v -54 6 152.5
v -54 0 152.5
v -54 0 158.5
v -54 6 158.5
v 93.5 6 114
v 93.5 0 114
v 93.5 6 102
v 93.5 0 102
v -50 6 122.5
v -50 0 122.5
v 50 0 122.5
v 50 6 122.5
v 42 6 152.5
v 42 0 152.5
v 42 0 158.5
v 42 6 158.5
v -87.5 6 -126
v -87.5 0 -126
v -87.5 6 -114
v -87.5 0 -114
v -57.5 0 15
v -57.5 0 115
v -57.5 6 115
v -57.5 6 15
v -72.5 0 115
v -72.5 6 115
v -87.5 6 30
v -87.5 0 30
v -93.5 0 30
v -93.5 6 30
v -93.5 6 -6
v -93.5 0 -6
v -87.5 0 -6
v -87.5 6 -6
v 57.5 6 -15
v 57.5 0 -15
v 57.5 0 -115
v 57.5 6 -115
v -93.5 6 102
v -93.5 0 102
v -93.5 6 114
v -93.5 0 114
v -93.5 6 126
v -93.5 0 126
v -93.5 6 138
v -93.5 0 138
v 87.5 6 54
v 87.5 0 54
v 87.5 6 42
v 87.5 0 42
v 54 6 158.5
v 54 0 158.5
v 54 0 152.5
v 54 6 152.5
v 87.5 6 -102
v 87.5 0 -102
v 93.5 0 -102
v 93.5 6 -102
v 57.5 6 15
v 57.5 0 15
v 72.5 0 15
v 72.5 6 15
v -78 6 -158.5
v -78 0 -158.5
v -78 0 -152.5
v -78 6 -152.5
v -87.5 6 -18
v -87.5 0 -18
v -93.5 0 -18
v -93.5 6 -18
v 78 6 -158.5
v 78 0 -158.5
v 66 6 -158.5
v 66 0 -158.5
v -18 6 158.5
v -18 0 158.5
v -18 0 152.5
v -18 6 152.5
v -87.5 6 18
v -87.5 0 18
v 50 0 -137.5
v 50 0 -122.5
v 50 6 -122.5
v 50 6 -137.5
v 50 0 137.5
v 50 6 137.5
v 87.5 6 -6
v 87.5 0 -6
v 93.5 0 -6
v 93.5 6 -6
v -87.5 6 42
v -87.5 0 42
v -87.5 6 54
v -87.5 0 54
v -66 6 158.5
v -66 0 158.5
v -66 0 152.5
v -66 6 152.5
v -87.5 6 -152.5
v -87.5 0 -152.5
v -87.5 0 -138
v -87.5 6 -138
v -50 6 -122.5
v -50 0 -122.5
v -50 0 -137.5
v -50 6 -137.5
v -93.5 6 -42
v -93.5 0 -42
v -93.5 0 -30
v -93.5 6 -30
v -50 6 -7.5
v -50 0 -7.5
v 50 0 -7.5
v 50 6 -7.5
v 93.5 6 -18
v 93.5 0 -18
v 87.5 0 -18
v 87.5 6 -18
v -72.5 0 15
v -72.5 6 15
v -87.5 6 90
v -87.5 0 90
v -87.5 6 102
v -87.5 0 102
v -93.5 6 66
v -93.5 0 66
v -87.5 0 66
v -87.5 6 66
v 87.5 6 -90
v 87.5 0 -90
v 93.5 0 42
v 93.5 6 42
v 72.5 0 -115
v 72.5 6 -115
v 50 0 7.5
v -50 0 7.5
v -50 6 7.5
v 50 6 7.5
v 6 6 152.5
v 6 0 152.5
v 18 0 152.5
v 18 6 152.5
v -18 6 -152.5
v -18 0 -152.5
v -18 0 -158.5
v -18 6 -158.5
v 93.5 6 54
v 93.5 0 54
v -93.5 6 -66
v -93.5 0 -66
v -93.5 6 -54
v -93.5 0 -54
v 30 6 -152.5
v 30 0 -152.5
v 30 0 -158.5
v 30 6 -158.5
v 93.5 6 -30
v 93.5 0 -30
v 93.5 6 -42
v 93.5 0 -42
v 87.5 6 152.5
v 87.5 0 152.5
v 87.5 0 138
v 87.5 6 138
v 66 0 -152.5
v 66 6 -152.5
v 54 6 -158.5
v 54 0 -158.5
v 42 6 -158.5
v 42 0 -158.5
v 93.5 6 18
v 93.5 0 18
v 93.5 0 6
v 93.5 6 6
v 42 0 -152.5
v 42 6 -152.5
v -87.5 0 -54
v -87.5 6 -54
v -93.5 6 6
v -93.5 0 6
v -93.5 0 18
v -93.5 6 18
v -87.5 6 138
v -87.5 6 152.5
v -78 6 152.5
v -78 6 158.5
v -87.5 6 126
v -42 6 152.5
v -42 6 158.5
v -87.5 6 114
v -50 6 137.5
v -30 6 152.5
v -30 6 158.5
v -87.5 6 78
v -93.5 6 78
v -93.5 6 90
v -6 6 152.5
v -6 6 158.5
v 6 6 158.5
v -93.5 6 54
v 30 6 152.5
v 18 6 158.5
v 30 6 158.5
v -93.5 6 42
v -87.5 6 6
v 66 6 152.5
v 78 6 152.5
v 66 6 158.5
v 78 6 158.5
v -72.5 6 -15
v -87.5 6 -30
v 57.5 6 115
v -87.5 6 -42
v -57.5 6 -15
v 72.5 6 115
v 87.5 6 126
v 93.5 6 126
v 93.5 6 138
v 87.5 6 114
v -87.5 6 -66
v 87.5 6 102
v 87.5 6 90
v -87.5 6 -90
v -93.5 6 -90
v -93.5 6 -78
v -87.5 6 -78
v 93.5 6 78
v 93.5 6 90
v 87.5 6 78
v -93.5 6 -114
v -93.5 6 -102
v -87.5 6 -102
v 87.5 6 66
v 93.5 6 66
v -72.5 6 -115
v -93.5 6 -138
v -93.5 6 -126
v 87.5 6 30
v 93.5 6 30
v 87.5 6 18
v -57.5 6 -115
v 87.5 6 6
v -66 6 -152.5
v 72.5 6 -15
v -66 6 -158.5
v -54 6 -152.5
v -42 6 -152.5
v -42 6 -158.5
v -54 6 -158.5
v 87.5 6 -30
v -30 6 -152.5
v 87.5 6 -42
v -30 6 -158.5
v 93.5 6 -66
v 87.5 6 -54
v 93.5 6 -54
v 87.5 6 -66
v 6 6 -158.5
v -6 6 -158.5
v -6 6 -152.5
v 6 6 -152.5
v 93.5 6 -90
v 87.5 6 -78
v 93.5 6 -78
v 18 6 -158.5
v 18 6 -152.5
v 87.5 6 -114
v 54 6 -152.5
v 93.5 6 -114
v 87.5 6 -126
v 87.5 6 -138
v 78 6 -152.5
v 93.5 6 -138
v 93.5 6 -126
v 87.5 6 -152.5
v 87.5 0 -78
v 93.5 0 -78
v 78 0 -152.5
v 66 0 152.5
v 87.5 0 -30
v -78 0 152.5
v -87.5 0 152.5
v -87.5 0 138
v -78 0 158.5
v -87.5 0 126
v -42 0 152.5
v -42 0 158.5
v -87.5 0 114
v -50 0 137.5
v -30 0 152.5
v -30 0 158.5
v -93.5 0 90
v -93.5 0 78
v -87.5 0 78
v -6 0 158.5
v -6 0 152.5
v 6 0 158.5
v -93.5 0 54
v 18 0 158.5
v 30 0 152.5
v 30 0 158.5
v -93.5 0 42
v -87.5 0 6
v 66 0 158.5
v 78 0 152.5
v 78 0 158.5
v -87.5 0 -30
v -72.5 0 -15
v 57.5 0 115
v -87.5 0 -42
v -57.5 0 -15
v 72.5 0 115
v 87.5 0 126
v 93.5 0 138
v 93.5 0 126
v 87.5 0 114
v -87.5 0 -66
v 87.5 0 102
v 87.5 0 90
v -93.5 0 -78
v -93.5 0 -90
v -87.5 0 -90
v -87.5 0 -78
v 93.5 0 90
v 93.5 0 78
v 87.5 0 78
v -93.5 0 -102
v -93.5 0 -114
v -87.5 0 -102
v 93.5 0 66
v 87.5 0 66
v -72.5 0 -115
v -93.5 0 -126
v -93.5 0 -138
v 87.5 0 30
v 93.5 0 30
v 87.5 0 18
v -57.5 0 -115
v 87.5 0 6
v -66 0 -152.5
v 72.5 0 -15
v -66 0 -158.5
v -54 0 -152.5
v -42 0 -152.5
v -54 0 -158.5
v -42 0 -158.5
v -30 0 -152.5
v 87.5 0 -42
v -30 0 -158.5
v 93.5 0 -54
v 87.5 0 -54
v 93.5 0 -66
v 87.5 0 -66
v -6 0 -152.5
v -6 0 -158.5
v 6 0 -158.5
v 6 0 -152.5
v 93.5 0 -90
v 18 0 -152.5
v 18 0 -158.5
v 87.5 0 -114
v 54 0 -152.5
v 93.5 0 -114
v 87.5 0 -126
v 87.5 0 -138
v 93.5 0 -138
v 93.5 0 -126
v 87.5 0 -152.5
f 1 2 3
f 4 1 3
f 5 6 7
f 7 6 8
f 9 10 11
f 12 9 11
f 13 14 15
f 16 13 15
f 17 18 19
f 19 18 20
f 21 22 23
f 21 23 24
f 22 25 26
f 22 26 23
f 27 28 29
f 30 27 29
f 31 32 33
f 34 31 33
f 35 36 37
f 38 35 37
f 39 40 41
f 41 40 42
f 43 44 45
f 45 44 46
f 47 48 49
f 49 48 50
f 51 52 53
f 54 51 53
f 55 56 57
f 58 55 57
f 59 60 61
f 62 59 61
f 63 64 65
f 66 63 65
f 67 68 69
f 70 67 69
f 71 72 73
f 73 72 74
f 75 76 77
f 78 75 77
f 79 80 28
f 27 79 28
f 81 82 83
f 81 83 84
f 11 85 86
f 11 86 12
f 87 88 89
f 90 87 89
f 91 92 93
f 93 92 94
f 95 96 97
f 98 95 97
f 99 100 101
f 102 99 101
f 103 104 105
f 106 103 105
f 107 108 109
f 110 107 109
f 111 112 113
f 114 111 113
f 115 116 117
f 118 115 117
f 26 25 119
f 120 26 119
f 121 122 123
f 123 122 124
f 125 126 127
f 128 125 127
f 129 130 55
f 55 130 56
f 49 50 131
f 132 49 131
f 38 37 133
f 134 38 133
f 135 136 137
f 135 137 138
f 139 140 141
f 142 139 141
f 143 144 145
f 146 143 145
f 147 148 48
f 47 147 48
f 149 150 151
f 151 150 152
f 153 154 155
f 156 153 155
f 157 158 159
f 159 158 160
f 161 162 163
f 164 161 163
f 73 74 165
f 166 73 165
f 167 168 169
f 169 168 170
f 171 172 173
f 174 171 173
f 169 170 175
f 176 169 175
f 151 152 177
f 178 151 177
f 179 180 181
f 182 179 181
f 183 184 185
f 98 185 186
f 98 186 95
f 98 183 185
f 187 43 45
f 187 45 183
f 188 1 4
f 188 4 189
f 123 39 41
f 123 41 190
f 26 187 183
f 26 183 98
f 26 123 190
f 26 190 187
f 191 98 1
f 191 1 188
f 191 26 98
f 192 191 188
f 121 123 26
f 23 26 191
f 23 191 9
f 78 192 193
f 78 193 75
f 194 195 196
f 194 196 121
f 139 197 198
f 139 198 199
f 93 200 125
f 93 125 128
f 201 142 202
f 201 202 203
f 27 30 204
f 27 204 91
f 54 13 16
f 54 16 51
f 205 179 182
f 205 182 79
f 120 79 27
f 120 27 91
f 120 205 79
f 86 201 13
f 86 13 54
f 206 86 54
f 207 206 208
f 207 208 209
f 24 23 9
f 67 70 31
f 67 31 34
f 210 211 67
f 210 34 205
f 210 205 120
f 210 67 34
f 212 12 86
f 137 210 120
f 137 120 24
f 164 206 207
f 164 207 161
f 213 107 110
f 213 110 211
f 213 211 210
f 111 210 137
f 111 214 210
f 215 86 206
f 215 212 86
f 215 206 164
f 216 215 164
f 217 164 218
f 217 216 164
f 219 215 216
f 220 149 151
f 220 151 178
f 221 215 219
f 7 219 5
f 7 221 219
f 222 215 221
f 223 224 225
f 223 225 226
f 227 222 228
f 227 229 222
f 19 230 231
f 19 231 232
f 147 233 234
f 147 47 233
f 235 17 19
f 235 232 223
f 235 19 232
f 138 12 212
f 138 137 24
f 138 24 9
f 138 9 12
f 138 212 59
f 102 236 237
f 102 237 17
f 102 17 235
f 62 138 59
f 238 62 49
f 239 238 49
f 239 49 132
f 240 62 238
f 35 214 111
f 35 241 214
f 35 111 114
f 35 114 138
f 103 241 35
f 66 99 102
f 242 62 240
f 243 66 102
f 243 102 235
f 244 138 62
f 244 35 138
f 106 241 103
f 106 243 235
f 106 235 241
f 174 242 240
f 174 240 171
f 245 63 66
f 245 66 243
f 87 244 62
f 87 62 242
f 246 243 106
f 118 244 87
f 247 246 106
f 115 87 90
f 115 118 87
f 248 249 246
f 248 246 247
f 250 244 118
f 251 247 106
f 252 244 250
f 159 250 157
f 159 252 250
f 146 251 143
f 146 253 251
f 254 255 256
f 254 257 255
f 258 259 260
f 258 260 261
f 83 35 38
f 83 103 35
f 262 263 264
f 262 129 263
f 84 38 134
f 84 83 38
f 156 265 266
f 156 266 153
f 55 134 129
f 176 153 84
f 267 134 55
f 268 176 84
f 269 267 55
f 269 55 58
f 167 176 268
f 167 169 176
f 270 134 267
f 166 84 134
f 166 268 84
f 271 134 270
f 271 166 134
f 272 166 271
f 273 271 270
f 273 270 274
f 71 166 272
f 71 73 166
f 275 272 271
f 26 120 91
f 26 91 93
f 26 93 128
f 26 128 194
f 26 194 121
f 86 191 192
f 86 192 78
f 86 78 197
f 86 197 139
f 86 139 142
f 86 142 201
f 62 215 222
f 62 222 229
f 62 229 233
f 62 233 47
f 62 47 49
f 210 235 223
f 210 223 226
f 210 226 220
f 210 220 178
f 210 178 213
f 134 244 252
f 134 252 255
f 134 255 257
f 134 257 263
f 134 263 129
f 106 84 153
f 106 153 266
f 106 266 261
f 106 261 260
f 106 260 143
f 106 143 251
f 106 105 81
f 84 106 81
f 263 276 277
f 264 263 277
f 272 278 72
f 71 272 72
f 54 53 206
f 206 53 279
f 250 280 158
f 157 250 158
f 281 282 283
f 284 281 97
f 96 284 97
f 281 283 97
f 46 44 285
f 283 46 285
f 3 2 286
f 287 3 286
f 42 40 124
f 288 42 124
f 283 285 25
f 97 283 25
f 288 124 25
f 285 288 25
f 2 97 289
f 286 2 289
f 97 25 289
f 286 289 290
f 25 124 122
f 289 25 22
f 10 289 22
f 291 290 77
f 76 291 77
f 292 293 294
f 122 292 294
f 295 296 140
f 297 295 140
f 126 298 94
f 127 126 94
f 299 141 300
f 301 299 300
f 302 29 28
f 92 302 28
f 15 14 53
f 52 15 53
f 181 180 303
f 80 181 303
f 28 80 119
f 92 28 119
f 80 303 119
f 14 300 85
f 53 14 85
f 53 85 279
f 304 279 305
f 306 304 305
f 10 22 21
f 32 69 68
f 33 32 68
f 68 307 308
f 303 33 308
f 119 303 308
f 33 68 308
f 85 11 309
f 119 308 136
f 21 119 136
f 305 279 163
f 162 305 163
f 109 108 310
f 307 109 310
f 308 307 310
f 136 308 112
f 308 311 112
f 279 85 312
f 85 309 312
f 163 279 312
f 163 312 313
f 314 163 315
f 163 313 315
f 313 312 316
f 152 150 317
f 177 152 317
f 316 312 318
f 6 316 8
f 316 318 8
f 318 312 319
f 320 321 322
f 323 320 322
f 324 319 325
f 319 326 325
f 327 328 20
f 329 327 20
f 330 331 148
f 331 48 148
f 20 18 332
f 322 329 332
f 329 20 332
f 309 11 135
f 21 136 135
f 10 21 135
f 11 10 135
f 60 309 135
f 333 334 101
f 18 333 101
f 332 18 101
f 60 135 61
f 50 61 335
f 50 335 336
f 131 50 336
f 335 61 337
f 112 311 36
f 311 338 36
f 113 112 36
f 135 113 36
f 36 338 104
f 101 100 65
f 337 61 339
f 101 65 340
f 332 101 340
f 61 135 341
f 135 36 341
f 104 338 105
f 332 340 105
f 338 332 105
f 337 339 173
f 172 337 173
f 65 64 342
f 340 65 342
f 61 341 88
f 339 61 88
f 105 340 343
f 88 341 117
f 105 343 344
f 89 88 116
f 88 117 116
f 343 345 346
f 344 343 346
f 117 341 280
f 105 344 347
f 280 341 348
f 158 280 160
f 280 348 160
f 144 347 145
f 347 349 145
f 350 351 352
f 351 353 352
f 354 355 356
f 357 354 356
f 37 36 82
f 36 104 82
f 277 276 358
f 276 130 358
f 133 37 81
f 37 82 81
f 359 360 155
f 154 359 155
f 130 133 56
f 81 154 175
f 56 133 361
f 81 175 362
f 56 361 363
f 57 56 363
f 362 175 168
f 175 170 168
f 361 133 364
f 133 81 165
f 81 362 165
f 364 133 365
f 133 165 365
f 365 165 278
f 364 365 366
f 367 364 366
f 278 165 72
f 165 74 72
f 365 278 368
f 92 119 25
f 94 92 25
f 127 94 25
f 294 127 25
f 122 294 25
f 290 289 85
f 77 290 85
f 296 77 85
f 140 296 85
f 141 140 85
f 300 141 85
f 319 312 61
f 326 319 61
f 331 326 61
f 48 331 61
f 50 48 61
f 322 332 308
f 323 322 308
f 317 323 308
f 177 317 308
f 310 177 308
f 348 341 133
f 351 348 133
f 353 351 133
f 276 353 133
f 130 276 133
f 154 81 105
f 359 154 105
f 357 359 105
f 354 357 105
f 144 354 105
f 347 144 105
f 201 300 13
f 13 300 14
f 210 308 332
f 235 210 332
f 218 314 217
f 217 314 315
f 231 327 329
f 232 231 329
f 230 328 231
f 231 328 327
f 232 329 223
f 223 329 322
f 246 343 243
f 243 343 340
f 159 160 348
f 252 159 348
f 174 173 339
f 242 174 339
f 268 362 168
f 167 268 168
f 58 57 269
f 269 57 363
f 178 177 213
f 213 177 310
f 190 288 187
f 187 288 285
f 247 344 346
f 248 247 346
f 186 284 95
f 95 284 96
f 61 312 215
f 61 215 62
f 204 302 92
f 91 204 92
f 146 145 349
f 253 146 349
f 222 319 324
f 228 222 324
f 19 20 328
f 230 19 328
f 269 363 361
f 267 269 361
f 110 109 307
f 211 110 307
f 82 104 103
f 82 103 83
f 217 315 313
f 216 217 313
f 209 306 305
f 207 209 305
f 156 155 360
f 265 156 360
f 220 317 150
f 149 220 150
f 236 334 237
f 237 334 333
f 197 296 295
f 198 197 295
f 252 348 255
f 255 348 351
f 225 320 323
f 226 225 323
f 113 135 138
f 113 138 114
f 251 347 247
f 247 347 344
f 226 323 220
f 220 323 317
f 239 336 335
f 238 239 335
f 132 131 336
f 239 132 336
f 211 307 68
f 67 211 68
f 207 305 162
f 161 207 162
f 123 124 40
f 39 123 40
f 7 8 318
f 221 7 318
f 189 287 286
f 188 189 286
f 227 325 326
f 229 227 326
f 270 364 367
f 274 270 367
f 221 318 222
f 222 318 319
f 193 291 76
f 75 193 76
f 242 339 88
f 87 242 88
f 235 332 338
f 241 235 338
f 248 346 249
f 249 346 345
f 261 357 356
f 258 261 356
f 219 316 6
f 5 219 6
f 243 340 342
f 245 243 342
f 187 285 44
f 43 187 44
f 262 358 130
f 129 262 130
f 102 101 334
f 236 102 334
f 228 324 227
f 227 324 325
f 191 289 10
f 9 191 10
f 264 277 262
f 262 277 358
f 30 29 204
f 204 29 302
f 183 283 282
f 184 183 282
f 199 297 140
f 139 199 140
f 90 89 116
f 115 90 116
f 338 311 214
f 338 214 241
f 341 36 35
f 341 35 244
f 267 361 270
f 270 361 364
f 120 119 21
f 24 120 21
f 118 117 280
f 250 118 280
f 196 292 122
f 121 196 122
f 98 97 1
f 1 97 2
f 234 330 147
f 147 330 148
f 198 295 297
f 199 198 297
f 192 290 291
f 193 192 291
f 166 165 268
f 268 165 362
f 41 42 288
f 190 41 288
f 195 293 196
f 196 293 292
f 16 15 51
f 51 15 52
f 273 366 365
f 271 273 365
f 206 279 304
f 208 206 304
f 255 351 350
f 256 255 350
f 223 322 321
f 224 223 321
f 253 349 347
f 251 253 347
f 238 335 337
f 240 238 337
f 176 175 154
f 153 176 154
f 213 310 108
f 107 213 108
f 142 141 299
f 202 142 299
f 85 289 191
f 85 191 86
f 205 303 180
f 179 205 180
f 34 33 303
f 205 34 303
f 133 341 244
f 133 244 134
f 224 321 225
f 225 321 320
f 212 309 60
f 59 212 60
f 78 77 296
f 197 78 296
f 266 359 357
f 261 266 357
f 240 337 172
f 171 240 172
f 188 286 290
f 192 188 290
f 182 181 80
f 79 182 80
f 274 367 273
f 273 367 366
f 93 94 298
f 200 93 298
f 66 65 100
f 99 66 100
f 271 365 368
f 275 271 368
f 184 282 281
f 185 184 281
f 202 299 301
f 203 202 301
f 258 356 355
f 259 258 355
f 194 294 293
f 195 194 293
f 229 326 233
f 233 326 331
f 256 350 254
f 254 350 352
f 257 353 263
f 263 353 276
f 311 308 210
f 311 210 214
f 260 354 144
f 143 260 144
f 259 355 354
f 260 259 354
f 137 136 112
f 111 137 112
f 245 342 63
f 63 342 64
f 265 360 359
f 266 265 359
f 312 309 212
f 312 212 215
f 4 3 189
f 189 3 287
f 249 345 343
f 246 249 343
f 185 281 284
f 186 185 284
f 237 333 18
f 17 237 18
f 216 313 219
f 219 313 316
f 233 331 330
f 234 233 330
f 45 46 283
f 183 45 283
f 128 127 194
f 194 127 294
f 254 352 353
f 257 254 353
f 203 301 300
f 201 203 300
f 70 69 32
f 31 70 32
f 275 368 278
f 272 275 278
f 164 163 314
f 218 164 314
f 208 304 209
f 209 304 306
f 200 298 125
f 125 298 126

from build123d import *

# Parameters (mm, degrees)
SKETCH3_W           = 15
SKETCH3_H           = 100
SKETCH3_W_2         = 100
SKETCH3_H_2         = 15
BOSS_EXTRUDE4_DEPTH = 6


with BuildPart() as part:
    # Sketch3 → Boss-Extrude4 (new body)
    with BuildSketch(Plane(origin=(0, 0, 0), x_dir=(1, 0, 0), z_dir=(0, 1, 0))):
        Polygon((-87.5, -152.5), (-78, -152.5), (-78, -158.5), (-66, -158.5), (-66, -152.5), (-54, -152.5), (-54, -158.5), (-42, -158.5), (-42, -152.5), (-30, -152.5), (-30, -158.5), (-18, -158.5), (-18, -152.5), (-6, -152.5), (-6, -158.5), (6, -158.5), (6, -152.5), (18, -152.5), (18, -158.5), (30, -158.5), (30, -152.5), (42, -152.5), (42, -158.5), (54, -158.5), (54, -152.5), (66, -152.5), (66, -158.5), (78, -158.5), (78, -152.5), (87.5, -152.5), (87.5, -138), (93.5, -138), (93.5, -126), (87.5, -126), (87.5, -114), (93.5, -114), (93.5, -102), (87.5, -102), (87.5, -90), (93.5, -90), (93.5, -78), (87.5, -78), (87.5, -66), (93.5, -66), (93.5, -54), (87.5, -54), (87.5, -42), (93.5, -42), (93.5, -30), (87.5, -30), (87.5, -18), (93.5, -18), (93.5, -6), (87.5, -6), (87.5, 6), (93.5, 6), (93.5, 18), (87.5, 18), (87.5, 30), (93.5, 30), (93.5, 42), (87.5, 42), (87.5, 54), (93.5, 54), (93.5, 66), (87.5, 66), (87.5, 78), (93.5, 78), (93.5, 90), (87.5, 90), (87.5, 102), (93.5, 102), (93.5, 114), (87.5, 114), (87.5, 126), (93.5, 126), (93.5, 138), (87.5, 138), (87.5, 152.5), (78, 152.5), (78, 158.5), (66, 158.5), (66, 152.5), (54, 152.5), (54, 158.5), (42, 158.5), (42, 152.5), (30, 152.5), (30, 158.5), (18, 158.5), (18, 152.5), (6, 152.5), (6, 158.5), (-6, 158.5), (-6, 152.5), (-18, 152.5), (-18, 158.5), (-30, 158.5), (-30, 152.5), (-42, 152.5), (-42, 158.5), (-54, 158.5), (-54, 152.5), (-66, 152.5), (-66, 158.5), (-78, 158.5), (-78, 152.5), (-87.5, 152.5), (-87.5, 138), (-93.5, 138), (-93.5, 126), (-87.5, 126), (-87.5, 114), (-93.5, 114), (-93.5, 102), (-87.5, 102), (-87.5, 90), (-93.5, 90), (-93.5, 78), (-87.5, 78), (-87.5, 66), (-93.5, 66), (-93.5, 54), (-87.5, 54), (-87.5, 42), (-93.5, 42), (-93.5, 30), (-87.5, 30), (-87.5, 18), (-93.5, 18), (-93.5, 6), (-87.5, 6), (-87.5, -6), (-93.5, -6), (-93.5, -18), (-87.5, -18), (-87.5, -30), (-93.5, -30), (-93.5, -42), (-87.5, -42), (-87.5, -54), (-93.5, -54), (-93.5, -66), (-87.5, -66), (-87.5, -78), (-93.5, -78), (-93.5, -90), (-87.5, -90), (-87.5, -102), (-93.5, -102), (-93.5, -114), (-87.5, -114), (-87.5, -126), (-93.5, -126), (-93.5, -138), (-87.5, -138), align=None)
        with Locations((-65, -65)):
            Rectangle(SKETCH3_W, SKETCH3_H, mode=Mode.SUBTRACT)
        with Locations((0, -130)):
            Rectangle(SKETCH3_W_2, SKETCH3_H_2, mode=Mode.SUBTRACT)
        Rectangle(SKETCH3_W_2, SKETCH3_H_2, mode=Mode.SUBTRACT)
        with Locations((65, -65)):
            Rectangle(SKETCH3_W, SKETCH3_H, mode=Mode.SUBTRACT)
        with Locations((-65, 65)):
            Rectangle(SKETCH3_W, SKETCH3_H, mode=Mode.SUBTRACT)
        with Locations((65, 65)):
            Rectangle(SKETCH3_W, SKETCH3_H, mode=Mode.SUBTRACT)
        with Locations((0, 130)):
            Rectangle(SKETCH3_W_2, SKETCH3_H_2, mode=Mode.SUBTRACT)
    extrude(amount=BOSS_EXTRUDE4_DEPTH)


solid = part.part
